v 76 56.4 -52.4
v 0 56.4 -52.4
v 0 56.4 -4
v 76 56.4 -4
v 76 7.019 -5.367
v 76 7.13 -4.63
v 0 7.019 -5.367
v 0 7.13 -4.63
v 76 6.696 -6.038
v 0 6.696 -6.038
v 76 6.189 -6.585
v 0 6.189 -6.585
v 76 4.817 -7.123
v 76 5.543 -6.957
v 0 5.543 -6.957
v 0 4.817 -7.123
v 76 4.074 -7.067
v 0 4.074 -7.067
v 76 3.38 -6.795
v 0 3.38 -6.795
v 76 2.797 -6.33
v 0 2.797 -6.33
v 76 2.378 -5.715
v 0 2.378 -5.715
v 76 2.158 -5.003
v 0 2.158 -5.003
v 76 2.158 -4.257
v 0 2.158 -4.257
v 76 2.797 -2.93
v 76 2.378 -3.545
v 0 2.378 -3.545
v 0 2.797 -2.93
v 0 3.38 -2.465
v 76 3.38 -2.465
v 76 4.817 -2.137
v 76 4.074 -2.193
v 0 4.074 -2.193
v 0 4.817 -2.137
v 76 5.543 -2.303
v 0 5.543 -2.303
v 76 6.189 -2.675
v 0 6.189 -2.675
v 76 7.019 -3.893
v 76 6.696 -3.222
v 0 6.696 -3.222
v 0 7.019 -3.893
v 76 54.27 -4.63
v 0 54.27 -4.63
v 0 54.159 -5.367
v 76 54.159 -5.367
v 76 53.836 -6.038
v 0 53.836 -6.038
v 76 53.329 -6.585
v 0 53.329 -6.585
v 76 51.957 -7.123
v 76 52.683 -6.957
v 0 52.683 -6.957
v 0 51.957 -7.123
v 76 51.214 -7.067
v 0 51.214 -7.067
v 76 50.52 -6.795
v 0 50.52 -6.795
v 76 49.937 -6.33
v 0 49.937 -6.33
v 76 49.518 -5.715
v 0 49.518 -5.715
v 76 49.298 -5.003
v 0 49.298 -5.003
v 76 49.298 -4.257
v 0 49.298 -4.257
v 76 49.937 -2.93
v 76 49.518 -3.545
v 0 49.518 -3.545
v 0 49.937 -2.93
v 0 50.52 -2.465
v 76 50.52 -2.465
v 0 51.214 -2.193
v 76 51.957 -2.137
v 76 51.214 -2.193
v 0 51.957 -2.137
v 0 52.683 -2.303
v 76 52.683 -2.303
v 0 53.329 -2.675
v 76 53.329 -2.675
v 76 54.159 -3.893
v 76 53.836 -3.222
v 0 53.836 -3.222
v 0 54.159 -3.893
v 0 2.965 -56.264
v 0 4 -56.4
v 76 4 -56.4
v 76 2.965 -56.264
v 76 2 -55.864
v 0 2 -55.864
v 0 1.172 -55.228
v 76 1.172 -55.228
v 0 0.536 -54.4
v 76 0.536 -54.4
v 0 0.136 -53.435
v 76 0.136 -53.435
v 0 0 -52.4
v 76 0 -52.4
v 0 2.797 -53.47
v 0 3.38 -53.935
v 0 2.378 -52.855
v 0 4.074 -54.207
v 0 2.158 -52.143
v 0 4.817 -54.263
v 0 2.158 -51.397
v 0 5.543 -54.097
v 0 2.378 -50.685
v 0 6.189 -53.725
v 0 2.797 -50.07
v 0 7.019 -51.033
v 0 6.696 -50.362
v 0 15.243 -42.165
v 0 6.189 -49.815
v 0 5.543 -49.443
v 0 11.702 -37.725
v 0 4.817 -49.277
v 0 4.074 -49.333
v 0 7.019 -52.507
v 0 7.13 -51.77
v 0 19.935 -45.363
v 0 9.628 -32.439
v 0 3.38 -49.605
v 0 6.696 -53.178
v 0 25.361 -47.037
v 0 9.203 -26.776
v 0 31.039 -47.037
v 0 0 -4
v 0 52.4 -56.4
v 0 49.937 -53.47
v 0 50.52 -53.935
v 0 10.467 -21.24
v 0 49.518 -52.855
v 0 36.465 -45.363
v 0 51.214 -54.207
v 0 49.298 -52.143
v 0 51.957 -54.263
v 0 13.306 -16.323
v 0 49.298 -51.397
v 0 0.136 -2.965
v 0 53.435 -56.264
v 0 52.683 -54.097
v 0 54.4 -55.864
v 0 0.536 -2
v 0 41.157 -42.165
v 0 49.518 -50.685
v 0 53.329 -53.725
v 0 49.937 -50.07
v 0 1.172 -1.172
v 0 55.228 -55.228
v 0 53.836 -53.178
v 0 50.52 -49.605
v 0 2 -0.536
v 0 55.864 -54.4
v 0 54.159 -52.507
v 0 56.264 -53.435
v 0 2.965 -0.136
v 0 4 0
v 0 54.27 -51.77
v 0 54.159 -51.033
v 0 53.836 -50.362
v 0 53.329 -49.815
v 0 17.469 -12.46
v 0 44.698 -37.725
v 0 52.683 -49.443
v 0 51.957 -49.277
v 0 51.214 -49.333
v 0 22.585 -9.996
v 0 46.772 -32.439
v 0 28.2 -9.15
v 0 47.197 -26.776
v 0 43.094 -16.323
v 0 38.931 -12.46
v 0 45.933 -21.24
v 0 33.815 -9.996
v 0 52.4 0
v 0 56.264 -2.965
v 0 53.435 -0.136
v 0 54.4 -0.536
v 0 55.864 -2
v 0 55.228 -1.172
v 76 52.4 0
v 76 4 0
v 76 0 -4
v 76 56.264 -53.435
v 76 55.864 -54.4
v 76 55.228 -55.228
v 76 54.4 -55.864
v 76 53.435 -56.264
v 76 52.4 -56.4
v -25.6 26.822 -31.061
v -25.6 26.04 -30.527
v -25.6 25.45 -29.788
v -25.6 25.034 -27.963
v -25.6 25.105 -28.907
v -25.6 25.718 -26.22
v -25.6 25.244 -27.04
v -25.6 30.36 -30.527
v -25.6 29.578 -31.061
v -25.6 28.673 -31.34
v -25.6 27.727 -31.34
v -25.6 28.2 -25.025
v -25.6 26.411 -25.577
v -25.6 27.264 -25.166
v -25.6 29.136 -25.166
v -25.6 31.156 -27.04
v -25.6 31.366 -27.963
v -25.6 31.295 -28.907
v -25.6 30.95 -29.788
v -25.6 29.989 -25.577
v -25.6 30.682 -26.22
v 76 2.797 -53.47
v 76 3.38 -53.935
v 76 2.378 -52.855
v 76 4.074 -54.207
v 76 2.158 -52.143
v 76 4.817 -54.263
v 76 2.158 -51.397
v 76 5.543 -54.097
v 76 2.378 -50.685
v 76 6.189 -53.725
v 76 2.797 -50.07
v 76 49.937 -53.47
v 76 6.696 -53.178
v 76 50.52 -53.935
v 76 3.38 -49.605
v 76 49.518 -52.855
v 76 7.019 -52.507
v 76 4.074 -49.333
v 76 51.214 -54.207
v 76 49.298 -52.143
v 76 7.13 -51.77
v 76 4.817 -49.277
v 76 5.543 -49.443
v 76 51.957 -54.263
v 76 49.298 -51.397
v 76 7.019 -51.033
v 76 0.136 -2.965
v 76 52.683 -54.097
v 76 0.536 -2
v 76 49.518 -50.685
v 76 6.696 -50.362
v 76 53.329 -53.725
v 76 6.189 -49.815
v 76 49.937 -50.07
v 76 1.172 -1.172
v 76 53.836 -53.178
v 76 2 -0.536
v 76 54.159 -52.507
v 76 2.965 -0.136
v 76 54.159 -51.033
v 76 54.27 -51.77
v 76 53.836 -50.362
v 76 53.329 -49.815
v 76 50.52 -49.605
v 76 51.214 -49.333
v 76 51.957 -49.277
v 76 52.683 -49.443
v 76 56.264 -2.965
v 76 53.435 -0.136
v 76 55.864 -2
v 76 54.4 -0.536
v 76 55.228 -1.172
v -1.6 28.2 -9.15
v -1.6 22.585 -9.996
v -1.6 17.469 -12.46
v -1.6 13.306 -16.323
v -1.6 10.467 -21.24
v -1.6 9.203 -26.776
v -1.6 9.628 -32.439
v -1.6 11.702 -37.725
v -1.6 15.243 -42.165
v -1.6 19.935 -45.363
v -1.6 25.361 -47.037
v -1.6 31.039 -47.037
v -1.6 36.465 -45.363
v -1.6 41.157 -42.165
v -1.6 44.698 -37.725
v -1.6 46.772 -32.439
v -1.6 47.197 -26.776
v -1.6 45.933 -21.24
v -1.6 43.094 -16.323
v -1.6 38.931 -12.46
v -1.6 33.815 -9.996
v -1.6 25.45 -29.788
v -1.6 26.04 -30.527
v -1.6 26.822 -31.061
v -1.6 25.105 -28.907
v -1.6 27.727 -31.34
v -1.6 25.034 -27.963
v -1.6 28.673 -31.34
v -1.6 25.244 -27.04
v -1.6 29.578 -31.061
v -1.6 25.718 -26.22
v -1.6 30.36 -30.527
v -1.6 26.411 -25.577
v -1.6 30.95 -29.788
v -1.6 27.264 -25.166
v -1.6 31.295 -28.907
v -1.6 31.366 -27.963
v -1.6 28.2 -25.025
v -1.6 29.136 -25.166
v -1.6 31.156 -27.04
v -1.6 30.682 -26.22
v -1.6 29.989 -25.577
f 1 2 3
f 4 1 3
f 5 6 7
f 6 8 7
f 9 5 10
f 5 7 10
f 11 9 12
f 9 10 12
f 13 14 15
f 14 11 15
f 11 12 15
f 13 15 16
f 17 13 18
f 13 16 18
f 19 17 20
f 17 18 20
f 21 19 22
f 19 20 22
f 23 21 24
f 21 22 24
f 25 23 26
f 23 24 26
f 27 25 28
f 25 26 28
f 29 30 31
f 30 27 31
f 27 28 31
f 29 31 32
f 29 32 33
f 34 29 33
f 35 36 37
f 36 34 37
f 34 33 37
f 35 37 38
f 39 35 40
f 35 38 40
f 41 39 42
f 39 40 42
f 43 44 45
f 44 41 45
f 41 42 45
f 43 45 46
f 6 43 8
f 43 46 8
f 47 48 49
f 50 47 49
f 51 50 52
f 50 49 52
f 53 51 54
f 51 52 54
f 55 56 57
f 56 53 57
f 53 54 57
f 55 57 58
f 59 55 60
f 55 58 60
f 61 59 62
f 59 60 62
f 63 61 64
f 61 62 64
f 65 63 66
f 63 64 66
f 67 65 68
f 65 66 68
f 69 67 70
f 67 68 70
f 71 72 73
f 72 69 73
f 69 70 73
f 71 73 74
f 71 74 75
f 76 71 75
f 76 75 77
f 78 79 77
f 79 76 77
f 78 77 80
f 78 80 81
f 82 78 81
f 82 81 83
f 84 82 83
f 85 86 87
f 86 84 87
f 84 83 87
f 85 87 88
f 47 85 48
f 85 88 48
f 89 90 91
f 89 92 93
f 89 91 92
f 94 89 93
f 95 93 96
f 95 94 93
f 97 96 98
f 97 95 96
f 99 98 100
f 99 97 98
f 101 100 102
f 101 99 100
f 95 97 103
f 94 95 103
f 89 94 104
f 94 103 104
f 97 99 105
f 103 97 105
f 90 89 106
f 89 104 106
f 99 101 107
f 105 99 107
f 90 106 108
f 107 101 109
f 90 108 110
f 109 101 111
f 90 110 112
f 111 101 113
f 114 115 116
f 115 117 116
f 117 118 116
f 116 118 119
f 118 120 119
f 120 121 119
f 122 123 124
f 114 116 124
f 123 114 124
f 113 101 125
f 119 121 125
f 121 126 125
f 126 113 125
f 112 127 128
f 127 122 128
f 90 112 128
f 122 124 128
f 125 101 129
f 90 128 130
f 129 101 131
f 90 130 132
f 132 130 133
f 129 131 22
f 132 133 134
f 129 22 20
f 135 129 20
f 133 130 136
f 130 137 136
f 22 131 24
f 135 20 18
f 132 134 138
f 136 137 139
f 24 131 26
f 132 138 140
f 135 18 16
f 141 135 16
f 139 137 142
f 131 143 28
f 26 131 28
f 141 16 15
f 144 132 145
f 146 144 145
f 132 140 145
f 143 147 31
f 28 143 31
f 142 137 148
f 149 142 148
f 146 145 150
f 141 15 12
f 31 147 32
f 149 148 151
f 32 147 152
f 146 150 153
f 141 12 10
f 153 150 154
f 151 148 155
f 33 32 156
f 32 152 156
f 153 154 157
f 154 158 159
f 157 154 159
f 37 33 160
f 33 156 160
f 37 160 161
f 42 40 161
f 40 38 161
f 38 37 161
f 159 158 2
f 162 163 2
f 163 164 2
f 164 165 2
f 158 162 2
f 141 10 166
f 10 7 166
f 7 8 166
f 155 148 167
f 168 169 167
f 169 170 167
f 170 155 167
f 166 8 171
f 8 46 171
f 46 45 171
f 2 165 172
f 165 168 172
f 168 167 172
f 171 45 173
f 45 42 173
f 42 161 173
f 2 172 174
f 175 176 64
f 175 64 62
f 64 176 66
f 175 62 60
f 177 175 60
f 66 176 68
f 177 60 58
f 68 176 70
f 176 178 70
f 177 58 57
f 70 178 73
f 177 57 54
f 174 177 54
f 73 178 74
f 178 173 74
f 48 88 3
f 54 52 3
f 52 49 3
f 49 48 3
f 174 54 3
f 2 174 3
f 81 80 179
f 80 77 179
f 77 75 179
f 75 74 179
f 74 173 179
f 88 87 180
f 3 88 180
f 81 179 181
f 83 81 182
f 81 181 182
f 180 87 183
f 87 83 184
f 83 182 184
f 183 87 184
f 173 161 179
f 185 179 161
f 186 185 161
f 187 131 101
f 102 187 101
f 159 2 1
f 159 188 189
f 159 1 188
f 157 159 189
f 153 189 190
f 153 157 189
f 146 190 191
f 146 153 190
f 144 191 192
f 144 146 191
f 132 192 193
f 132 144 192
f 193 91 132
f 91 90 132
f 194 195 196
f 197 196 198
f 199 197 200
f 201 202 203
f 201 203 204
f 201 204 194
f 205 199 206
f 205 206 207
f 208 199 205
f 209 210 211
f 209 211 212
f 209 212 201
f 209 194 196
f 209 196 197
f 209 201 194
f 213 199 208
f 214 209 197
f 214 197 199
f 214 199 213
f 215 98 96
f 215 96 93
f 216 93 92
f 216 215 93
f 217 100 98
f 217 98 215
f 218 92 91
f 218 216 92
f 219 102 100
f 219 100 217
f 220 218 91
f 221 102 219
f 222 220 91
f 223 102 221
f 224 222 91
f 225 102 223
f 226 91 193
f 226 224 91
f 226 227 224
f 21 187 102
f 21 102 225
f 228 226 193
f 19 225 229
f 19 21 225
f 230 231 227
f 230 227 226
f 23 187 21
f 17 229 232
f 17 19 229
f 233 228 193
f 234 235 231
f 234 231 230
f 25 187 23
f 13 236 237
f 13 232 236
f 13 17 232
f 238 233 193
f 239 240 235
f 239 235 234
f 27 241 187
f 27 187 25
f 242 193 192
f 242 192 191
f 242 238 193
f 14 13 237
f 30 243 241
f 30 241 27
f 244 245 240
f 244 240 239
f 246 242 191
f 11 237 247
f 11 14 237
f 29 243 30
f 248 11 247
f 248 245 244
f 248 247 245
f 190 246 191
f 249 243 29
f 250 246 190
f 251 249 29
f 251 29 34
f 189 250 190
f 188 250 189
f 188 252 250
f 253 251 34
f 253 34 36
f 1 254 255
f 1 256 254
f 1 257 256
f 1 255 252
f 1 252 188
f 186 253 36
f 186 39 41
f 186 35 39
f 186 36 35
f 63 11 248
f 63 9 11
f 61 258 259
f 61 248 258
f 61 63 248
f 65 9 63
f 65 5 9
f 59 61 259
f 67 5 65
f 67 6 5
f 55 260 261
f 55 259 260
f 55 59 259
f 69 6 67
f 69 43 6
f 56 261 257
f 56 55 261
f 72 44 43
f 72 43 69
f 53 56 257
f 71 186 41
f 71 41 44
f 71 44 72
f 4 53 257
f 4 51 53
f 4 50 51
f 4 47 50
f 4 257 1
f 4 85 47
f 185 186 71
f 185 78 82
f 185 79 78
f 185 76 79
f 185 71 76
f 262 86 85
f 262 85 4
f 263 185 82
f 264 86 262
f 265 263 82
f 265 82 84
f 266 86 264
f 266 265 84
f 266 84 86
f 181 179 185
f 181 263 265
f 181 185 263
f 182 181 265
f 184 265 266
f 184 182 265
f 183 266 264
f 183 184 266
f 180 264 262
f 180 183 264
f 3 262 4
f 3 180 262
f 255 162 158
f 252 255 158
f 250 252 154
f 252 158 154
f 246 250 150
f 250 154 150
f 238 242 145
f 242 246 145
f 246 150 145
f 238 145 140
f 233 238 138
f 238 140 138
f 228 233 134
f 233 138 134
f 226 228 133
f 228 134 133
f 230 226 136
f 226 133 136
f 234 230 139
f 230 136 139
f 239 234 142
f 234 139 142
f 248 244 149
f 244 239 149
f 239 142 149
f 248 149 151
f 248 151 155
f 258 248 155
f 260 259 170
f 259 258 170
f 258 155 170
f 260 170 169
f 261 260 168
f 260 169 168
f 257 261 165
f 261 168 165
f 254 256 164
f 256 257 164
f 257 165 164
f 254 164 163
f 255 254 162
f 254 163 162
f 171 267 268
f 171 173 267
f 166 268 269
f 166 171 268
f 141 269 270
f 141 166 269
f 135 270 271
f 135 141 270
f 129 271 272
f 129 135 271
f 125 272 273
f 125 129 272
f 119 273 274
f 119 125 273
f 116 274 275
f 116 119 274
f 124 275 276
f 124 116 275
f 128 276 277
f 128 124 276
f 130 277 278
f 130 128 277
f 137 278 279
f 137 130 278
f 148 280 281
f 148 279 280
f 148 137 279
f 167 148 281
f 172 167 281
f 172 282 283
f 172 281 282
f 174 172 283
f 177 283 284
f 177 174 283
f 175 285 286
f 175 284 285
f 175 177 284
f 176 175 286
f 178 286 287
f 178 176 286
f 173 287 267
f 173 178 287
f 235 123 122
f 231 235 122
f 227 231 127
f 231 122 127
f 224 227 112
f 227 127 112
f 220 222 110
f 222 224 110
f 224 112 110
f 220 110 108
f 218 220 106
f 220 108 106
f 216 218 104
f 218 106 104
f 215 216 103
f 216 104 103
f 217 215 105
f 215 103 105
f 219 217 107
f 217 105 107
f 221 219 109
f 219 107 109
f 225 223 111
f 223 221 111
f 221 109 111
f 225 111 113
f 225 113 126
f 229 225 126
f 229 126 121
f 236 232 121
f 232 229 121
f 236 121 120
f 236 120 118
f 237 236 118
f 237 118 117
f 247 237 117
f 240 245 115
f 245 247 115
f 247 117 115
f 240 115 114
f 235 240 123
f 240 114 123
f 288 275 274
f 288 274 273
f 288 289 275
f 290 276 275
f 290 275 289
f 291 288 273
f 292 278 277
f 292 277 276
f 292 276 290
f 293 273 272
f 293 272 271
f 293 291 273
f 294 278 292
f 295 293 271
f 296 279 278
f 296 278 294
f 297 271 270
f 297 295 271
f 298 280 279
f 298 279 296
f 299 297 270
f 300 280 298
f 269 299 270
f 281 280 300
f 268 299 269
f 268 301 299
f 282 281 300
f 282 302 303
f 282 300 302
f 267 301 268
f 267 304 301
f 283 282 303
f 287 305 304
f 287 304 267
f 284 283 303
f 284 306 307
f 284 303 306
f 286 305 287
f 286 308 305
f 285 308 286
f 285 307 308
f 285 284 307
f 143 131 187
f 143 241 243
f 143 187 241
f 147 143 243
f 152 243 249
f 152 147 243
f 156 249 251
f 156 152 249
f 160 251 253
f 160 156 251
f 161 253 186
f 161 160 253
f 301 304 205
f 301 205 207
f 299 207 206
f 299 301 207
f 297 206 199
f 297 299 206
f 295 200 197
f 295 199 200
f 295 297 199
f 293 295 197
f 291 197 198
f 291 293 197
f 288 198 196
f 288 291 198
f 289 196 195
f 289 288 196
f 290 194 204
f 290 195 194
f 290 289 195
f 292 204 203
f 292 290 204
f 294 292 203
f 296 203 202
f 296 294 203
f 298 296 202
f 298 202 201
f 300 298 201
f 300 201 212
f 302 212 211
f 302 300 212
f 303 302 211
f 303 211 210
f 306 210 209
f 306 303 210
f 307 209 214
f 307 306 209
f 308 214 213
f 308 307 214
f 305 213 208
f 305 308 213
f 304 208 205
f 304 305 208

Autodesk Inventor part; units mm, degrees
ref_plane "YZ Plane" through (0, 0, 0) normal (1, 0, 0) x (0, 1, 0)
ref_plane "XZ Plane" through (0, 0, 0) normal (0, 1, 0) x (-1, 0, 0)
ref_plane "XY Plane" through (0, 0, 0) normal (0, 0, 1) x (1, 0, 0)
sketch "Sketch1" plane through (0, 0, 0) normal (1, 0, 0) x (0, 1, 0)
  line L0 (52.4, 0) -> (4, 0)
  line L1 (0, -4) -> (0, -52.4)
  line L2 (4, -56.4) -> (52.4, -56.4)
  line L3 (56.4, -52.4) -> (56.4, -4)
  line L4 (51.77, -4.63) -> (4.63, -4.63) construction
  line L5 (4.63, -4.63) -> (4.63, -51.77) construction
  line L6 (4.63, -51.77) -> (51.77, -51.77) construction
  line L7 (51.77, -51.77) -> (51.77, -4.63) construction
  circle A0 centre (51.77, -4.63) radius 2.5
  circle A1 centre (51.77, -51.77) radius 2.5
  circle A2 centre (4.63, -4.63) radius 2.5
  circle A3 centre (4.63, -51.77) radius 2.5
  arc A4 (56.4, -4) -> (52.4, 0) centre (52.4, -4) ccw
  arc A5 (52.4, -56.4) -> (56.4, -52.4) centre (52.4, -52.4) ccw
  arc A6 (0, -52.4) -> (4, -56.4) centre (4, -52.4) ccw
  arc A7 (4, 0) -> (0, -4) centre (4, -4) ccw
  point P0 (0, 0)
  point P1 (56.4, 0)
  point P2 (0, 0)
  point P3 (56.4, -56.4)
  point P4 (56.4, -28.2)
  point P5 (51.77, -28.2)
  point P6 (28.2, -51.77)
  point P7 (28.2, -56.4)
  dimension "d0" = 56.4
  dimension "d1" = 47.14
  dimension "d2" = 5
  dimension "d3" = 4
  dimension "d4" = 4
  dimension "d5" = 4
  dimension "d6" = 4
extrude "Extrusion1" add sketch "Sketch1" along normal blind 76
sketch "Sketch2" plane through (0, 0, 0) normal (-1, 0, 0) x (0, 0, 1)
  circle A0 centre (-28.2, 28.2) radius 19.05
  line L0 (-52.4, 56.4) -> (-4, 56.4) projected
  line L1 (-56.4, 4) -> (-56.4, 52.4) projected
  point P0 (0, 0)
  point P1 (-28.2, 56.4)
  point P2 (-56.4, 28.2)
  dimension "d9" = 38.1
extrude "Extrusion2" add sketch "Sketch2" along normal blind 1.6
sketch "Sketch3" plane through (-1.6, 28.2, -28.2) normal (-1, 0, 0) x (0, 0, 1)
  circle A0 centre (0, 0) radius 3.175
  circle A1 centre (0, 0) radius 19.05 construction
  point P0 (28.2, -28.2)
  dimension "d12" = 6.35
extrude "Extrusion3" add sketch "Sketch3" along normal blind 24
properties part number "Nema23"
